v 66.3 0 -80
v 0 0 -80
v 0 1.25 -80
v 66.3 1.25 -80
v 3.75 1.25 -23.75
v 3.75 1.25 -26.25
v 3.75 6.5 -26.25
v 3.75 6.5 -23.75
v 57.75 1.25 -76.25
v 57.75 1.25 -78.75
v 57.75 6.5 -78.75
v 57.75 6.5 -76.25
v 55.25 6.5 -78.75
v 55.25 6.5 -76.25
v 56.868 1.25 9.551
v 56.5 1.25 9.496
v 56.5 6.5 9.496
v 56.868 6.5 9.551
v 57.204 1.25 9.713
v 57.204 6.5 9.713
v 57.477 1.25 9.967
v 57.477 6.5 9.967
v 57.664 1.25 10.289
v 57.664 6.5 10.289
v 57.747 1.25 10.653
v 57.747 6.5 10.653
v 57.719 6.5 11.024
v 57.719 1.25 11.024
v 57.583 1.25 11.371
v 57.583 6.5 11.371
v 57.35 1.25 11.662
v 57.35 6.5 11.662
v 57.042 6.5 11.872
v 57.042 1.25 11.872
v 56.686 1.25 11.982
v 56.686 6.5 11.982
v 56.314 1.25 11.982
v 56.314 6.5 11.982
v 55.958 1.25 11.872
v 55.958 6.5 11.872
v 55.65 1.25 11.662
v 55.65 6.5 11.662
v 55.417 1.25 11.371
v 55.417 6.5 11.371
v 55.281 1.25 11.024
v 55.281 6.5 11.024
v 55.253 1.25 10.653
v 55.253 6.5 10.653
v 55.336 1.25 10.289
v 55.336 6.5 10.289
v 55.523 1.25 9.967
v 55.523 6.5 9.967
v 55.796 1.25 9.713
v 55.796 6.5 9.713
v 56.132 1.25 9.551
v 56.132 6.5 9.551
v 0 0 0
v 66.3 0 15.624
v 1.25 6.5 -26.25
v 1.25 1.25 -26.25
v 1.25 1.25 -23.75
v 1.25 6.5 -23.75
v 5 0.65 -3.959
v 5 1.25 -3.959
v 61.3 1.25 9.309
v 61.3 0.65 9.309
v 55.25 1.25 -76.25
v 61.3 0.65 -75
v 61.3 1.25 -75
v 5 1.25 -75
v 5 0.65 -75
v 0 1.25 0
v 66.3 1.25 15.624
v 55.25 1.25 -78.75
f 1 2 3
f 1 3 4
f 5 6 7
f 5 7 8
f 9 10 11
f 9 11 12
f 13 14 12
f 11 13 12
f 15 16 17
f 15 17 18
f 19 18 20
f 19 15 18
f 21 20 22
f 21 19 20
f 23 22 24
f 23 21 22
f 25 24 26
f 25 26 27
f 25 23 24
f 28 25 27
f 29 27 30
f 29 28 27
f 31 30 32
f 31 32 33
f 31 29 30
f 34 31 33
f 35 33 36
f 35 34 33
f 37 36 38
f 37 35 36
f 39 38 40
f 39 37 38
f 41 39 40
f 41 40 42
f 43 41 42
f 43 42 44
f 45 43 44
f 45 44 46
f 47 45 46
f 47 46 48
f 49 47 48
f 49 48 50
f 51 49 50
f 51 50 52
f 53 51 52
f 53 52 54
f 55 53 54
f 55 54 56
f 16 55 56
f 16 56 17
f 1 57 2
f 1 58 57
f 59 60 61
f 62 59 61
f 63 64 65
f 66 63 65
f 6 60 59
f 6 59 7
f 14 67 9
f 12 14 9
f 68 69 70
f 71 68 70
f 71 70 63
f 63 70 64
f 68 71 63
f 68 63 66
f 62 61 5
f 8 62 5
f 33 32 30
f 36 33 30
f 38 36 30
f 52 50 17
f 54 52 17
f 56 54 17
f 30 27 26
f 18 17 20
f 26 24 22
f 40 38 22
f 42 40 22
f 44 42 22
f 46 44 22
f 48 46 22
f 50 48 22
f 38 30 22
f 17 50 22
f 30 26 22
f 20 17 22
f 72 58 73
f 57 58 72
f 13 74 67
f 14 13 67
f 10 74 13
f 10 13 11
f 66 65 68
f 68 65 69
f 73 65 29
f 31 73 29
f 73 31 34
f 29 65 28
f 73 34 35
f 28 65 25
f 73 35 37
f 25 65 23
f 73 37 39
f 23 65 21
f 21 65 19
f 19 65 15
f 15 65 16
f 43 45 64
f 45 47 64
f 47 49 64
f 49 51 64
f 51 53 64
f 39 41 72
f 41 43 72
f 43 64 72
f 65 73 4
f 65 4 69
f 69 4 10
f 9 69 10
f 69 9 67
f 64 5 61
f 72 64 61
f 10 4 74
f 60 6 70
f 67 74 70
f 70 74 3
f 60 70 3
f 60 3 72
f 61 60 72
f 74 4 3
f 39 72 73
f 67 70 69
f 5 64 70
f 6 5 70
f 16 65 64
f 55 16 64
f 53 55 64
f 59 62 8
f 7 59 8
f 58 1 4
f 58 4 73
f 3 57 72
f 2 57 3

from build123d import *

# Parameters (mm, degrees)
BOSS_EXTRUDE1_DEPTH = 1.25
SKETCH2_R           = 1.25
SKETCH2_W           = 2.5
SKETCH2_H           = 2.5
BOSS_EXTRUDE2_DEPTH = 6.5
CUT_EXTRUDE1_DEPTH  = 0.6


with BuildPart() as part:
    # Sketch1 → Boss-Extrude1 (new body)
    with BuildSketch(Plane(origin=(0, 0, 0), x_dir=(1, 0, 0), z_dir=(0, 1, 0))):
        Polygon((0, 0), (0, 80), (66.3, 80), (66.3, -15.623791318), align=None)
    extrude(amount=BOSS_EXTRUDE1_DEPTH)

    # Sketch2 → Boss-Extrude2 (add)
    with BuildSketch(Plane.XZ):
        with Locations(Location((56.5, 10.745914737, 0), (0, 0, 270))):
            Circle(SKETCH2_R)
        with Locations((56.5, -77.5)):
            Rectangle(SKETCH2_W, SKETCH2_H)
        with Locations((2.5, -25)):
            Rectangle(SKETCH2_W, SKETCH2_H)
    extrude(amount=-BOSS_EXTRUDE2_DEPTH)

    # Sketch4 → Cut-Extrude1 (cut)
    with BuildSketch(Plane(origin=(0, 1.25, 0), x_dir=(1, 0, 0), z_dir=(0, 1, 0))):
        Polygon((5, 75), (5, 3.958690319), (61.3, -9.308571388), (61.3, 75), align=None)
    extrude(amount=-CUT_EXTRUDE1_DEPTH, mode=Mode.SUBTRACT)


solid = part.part
